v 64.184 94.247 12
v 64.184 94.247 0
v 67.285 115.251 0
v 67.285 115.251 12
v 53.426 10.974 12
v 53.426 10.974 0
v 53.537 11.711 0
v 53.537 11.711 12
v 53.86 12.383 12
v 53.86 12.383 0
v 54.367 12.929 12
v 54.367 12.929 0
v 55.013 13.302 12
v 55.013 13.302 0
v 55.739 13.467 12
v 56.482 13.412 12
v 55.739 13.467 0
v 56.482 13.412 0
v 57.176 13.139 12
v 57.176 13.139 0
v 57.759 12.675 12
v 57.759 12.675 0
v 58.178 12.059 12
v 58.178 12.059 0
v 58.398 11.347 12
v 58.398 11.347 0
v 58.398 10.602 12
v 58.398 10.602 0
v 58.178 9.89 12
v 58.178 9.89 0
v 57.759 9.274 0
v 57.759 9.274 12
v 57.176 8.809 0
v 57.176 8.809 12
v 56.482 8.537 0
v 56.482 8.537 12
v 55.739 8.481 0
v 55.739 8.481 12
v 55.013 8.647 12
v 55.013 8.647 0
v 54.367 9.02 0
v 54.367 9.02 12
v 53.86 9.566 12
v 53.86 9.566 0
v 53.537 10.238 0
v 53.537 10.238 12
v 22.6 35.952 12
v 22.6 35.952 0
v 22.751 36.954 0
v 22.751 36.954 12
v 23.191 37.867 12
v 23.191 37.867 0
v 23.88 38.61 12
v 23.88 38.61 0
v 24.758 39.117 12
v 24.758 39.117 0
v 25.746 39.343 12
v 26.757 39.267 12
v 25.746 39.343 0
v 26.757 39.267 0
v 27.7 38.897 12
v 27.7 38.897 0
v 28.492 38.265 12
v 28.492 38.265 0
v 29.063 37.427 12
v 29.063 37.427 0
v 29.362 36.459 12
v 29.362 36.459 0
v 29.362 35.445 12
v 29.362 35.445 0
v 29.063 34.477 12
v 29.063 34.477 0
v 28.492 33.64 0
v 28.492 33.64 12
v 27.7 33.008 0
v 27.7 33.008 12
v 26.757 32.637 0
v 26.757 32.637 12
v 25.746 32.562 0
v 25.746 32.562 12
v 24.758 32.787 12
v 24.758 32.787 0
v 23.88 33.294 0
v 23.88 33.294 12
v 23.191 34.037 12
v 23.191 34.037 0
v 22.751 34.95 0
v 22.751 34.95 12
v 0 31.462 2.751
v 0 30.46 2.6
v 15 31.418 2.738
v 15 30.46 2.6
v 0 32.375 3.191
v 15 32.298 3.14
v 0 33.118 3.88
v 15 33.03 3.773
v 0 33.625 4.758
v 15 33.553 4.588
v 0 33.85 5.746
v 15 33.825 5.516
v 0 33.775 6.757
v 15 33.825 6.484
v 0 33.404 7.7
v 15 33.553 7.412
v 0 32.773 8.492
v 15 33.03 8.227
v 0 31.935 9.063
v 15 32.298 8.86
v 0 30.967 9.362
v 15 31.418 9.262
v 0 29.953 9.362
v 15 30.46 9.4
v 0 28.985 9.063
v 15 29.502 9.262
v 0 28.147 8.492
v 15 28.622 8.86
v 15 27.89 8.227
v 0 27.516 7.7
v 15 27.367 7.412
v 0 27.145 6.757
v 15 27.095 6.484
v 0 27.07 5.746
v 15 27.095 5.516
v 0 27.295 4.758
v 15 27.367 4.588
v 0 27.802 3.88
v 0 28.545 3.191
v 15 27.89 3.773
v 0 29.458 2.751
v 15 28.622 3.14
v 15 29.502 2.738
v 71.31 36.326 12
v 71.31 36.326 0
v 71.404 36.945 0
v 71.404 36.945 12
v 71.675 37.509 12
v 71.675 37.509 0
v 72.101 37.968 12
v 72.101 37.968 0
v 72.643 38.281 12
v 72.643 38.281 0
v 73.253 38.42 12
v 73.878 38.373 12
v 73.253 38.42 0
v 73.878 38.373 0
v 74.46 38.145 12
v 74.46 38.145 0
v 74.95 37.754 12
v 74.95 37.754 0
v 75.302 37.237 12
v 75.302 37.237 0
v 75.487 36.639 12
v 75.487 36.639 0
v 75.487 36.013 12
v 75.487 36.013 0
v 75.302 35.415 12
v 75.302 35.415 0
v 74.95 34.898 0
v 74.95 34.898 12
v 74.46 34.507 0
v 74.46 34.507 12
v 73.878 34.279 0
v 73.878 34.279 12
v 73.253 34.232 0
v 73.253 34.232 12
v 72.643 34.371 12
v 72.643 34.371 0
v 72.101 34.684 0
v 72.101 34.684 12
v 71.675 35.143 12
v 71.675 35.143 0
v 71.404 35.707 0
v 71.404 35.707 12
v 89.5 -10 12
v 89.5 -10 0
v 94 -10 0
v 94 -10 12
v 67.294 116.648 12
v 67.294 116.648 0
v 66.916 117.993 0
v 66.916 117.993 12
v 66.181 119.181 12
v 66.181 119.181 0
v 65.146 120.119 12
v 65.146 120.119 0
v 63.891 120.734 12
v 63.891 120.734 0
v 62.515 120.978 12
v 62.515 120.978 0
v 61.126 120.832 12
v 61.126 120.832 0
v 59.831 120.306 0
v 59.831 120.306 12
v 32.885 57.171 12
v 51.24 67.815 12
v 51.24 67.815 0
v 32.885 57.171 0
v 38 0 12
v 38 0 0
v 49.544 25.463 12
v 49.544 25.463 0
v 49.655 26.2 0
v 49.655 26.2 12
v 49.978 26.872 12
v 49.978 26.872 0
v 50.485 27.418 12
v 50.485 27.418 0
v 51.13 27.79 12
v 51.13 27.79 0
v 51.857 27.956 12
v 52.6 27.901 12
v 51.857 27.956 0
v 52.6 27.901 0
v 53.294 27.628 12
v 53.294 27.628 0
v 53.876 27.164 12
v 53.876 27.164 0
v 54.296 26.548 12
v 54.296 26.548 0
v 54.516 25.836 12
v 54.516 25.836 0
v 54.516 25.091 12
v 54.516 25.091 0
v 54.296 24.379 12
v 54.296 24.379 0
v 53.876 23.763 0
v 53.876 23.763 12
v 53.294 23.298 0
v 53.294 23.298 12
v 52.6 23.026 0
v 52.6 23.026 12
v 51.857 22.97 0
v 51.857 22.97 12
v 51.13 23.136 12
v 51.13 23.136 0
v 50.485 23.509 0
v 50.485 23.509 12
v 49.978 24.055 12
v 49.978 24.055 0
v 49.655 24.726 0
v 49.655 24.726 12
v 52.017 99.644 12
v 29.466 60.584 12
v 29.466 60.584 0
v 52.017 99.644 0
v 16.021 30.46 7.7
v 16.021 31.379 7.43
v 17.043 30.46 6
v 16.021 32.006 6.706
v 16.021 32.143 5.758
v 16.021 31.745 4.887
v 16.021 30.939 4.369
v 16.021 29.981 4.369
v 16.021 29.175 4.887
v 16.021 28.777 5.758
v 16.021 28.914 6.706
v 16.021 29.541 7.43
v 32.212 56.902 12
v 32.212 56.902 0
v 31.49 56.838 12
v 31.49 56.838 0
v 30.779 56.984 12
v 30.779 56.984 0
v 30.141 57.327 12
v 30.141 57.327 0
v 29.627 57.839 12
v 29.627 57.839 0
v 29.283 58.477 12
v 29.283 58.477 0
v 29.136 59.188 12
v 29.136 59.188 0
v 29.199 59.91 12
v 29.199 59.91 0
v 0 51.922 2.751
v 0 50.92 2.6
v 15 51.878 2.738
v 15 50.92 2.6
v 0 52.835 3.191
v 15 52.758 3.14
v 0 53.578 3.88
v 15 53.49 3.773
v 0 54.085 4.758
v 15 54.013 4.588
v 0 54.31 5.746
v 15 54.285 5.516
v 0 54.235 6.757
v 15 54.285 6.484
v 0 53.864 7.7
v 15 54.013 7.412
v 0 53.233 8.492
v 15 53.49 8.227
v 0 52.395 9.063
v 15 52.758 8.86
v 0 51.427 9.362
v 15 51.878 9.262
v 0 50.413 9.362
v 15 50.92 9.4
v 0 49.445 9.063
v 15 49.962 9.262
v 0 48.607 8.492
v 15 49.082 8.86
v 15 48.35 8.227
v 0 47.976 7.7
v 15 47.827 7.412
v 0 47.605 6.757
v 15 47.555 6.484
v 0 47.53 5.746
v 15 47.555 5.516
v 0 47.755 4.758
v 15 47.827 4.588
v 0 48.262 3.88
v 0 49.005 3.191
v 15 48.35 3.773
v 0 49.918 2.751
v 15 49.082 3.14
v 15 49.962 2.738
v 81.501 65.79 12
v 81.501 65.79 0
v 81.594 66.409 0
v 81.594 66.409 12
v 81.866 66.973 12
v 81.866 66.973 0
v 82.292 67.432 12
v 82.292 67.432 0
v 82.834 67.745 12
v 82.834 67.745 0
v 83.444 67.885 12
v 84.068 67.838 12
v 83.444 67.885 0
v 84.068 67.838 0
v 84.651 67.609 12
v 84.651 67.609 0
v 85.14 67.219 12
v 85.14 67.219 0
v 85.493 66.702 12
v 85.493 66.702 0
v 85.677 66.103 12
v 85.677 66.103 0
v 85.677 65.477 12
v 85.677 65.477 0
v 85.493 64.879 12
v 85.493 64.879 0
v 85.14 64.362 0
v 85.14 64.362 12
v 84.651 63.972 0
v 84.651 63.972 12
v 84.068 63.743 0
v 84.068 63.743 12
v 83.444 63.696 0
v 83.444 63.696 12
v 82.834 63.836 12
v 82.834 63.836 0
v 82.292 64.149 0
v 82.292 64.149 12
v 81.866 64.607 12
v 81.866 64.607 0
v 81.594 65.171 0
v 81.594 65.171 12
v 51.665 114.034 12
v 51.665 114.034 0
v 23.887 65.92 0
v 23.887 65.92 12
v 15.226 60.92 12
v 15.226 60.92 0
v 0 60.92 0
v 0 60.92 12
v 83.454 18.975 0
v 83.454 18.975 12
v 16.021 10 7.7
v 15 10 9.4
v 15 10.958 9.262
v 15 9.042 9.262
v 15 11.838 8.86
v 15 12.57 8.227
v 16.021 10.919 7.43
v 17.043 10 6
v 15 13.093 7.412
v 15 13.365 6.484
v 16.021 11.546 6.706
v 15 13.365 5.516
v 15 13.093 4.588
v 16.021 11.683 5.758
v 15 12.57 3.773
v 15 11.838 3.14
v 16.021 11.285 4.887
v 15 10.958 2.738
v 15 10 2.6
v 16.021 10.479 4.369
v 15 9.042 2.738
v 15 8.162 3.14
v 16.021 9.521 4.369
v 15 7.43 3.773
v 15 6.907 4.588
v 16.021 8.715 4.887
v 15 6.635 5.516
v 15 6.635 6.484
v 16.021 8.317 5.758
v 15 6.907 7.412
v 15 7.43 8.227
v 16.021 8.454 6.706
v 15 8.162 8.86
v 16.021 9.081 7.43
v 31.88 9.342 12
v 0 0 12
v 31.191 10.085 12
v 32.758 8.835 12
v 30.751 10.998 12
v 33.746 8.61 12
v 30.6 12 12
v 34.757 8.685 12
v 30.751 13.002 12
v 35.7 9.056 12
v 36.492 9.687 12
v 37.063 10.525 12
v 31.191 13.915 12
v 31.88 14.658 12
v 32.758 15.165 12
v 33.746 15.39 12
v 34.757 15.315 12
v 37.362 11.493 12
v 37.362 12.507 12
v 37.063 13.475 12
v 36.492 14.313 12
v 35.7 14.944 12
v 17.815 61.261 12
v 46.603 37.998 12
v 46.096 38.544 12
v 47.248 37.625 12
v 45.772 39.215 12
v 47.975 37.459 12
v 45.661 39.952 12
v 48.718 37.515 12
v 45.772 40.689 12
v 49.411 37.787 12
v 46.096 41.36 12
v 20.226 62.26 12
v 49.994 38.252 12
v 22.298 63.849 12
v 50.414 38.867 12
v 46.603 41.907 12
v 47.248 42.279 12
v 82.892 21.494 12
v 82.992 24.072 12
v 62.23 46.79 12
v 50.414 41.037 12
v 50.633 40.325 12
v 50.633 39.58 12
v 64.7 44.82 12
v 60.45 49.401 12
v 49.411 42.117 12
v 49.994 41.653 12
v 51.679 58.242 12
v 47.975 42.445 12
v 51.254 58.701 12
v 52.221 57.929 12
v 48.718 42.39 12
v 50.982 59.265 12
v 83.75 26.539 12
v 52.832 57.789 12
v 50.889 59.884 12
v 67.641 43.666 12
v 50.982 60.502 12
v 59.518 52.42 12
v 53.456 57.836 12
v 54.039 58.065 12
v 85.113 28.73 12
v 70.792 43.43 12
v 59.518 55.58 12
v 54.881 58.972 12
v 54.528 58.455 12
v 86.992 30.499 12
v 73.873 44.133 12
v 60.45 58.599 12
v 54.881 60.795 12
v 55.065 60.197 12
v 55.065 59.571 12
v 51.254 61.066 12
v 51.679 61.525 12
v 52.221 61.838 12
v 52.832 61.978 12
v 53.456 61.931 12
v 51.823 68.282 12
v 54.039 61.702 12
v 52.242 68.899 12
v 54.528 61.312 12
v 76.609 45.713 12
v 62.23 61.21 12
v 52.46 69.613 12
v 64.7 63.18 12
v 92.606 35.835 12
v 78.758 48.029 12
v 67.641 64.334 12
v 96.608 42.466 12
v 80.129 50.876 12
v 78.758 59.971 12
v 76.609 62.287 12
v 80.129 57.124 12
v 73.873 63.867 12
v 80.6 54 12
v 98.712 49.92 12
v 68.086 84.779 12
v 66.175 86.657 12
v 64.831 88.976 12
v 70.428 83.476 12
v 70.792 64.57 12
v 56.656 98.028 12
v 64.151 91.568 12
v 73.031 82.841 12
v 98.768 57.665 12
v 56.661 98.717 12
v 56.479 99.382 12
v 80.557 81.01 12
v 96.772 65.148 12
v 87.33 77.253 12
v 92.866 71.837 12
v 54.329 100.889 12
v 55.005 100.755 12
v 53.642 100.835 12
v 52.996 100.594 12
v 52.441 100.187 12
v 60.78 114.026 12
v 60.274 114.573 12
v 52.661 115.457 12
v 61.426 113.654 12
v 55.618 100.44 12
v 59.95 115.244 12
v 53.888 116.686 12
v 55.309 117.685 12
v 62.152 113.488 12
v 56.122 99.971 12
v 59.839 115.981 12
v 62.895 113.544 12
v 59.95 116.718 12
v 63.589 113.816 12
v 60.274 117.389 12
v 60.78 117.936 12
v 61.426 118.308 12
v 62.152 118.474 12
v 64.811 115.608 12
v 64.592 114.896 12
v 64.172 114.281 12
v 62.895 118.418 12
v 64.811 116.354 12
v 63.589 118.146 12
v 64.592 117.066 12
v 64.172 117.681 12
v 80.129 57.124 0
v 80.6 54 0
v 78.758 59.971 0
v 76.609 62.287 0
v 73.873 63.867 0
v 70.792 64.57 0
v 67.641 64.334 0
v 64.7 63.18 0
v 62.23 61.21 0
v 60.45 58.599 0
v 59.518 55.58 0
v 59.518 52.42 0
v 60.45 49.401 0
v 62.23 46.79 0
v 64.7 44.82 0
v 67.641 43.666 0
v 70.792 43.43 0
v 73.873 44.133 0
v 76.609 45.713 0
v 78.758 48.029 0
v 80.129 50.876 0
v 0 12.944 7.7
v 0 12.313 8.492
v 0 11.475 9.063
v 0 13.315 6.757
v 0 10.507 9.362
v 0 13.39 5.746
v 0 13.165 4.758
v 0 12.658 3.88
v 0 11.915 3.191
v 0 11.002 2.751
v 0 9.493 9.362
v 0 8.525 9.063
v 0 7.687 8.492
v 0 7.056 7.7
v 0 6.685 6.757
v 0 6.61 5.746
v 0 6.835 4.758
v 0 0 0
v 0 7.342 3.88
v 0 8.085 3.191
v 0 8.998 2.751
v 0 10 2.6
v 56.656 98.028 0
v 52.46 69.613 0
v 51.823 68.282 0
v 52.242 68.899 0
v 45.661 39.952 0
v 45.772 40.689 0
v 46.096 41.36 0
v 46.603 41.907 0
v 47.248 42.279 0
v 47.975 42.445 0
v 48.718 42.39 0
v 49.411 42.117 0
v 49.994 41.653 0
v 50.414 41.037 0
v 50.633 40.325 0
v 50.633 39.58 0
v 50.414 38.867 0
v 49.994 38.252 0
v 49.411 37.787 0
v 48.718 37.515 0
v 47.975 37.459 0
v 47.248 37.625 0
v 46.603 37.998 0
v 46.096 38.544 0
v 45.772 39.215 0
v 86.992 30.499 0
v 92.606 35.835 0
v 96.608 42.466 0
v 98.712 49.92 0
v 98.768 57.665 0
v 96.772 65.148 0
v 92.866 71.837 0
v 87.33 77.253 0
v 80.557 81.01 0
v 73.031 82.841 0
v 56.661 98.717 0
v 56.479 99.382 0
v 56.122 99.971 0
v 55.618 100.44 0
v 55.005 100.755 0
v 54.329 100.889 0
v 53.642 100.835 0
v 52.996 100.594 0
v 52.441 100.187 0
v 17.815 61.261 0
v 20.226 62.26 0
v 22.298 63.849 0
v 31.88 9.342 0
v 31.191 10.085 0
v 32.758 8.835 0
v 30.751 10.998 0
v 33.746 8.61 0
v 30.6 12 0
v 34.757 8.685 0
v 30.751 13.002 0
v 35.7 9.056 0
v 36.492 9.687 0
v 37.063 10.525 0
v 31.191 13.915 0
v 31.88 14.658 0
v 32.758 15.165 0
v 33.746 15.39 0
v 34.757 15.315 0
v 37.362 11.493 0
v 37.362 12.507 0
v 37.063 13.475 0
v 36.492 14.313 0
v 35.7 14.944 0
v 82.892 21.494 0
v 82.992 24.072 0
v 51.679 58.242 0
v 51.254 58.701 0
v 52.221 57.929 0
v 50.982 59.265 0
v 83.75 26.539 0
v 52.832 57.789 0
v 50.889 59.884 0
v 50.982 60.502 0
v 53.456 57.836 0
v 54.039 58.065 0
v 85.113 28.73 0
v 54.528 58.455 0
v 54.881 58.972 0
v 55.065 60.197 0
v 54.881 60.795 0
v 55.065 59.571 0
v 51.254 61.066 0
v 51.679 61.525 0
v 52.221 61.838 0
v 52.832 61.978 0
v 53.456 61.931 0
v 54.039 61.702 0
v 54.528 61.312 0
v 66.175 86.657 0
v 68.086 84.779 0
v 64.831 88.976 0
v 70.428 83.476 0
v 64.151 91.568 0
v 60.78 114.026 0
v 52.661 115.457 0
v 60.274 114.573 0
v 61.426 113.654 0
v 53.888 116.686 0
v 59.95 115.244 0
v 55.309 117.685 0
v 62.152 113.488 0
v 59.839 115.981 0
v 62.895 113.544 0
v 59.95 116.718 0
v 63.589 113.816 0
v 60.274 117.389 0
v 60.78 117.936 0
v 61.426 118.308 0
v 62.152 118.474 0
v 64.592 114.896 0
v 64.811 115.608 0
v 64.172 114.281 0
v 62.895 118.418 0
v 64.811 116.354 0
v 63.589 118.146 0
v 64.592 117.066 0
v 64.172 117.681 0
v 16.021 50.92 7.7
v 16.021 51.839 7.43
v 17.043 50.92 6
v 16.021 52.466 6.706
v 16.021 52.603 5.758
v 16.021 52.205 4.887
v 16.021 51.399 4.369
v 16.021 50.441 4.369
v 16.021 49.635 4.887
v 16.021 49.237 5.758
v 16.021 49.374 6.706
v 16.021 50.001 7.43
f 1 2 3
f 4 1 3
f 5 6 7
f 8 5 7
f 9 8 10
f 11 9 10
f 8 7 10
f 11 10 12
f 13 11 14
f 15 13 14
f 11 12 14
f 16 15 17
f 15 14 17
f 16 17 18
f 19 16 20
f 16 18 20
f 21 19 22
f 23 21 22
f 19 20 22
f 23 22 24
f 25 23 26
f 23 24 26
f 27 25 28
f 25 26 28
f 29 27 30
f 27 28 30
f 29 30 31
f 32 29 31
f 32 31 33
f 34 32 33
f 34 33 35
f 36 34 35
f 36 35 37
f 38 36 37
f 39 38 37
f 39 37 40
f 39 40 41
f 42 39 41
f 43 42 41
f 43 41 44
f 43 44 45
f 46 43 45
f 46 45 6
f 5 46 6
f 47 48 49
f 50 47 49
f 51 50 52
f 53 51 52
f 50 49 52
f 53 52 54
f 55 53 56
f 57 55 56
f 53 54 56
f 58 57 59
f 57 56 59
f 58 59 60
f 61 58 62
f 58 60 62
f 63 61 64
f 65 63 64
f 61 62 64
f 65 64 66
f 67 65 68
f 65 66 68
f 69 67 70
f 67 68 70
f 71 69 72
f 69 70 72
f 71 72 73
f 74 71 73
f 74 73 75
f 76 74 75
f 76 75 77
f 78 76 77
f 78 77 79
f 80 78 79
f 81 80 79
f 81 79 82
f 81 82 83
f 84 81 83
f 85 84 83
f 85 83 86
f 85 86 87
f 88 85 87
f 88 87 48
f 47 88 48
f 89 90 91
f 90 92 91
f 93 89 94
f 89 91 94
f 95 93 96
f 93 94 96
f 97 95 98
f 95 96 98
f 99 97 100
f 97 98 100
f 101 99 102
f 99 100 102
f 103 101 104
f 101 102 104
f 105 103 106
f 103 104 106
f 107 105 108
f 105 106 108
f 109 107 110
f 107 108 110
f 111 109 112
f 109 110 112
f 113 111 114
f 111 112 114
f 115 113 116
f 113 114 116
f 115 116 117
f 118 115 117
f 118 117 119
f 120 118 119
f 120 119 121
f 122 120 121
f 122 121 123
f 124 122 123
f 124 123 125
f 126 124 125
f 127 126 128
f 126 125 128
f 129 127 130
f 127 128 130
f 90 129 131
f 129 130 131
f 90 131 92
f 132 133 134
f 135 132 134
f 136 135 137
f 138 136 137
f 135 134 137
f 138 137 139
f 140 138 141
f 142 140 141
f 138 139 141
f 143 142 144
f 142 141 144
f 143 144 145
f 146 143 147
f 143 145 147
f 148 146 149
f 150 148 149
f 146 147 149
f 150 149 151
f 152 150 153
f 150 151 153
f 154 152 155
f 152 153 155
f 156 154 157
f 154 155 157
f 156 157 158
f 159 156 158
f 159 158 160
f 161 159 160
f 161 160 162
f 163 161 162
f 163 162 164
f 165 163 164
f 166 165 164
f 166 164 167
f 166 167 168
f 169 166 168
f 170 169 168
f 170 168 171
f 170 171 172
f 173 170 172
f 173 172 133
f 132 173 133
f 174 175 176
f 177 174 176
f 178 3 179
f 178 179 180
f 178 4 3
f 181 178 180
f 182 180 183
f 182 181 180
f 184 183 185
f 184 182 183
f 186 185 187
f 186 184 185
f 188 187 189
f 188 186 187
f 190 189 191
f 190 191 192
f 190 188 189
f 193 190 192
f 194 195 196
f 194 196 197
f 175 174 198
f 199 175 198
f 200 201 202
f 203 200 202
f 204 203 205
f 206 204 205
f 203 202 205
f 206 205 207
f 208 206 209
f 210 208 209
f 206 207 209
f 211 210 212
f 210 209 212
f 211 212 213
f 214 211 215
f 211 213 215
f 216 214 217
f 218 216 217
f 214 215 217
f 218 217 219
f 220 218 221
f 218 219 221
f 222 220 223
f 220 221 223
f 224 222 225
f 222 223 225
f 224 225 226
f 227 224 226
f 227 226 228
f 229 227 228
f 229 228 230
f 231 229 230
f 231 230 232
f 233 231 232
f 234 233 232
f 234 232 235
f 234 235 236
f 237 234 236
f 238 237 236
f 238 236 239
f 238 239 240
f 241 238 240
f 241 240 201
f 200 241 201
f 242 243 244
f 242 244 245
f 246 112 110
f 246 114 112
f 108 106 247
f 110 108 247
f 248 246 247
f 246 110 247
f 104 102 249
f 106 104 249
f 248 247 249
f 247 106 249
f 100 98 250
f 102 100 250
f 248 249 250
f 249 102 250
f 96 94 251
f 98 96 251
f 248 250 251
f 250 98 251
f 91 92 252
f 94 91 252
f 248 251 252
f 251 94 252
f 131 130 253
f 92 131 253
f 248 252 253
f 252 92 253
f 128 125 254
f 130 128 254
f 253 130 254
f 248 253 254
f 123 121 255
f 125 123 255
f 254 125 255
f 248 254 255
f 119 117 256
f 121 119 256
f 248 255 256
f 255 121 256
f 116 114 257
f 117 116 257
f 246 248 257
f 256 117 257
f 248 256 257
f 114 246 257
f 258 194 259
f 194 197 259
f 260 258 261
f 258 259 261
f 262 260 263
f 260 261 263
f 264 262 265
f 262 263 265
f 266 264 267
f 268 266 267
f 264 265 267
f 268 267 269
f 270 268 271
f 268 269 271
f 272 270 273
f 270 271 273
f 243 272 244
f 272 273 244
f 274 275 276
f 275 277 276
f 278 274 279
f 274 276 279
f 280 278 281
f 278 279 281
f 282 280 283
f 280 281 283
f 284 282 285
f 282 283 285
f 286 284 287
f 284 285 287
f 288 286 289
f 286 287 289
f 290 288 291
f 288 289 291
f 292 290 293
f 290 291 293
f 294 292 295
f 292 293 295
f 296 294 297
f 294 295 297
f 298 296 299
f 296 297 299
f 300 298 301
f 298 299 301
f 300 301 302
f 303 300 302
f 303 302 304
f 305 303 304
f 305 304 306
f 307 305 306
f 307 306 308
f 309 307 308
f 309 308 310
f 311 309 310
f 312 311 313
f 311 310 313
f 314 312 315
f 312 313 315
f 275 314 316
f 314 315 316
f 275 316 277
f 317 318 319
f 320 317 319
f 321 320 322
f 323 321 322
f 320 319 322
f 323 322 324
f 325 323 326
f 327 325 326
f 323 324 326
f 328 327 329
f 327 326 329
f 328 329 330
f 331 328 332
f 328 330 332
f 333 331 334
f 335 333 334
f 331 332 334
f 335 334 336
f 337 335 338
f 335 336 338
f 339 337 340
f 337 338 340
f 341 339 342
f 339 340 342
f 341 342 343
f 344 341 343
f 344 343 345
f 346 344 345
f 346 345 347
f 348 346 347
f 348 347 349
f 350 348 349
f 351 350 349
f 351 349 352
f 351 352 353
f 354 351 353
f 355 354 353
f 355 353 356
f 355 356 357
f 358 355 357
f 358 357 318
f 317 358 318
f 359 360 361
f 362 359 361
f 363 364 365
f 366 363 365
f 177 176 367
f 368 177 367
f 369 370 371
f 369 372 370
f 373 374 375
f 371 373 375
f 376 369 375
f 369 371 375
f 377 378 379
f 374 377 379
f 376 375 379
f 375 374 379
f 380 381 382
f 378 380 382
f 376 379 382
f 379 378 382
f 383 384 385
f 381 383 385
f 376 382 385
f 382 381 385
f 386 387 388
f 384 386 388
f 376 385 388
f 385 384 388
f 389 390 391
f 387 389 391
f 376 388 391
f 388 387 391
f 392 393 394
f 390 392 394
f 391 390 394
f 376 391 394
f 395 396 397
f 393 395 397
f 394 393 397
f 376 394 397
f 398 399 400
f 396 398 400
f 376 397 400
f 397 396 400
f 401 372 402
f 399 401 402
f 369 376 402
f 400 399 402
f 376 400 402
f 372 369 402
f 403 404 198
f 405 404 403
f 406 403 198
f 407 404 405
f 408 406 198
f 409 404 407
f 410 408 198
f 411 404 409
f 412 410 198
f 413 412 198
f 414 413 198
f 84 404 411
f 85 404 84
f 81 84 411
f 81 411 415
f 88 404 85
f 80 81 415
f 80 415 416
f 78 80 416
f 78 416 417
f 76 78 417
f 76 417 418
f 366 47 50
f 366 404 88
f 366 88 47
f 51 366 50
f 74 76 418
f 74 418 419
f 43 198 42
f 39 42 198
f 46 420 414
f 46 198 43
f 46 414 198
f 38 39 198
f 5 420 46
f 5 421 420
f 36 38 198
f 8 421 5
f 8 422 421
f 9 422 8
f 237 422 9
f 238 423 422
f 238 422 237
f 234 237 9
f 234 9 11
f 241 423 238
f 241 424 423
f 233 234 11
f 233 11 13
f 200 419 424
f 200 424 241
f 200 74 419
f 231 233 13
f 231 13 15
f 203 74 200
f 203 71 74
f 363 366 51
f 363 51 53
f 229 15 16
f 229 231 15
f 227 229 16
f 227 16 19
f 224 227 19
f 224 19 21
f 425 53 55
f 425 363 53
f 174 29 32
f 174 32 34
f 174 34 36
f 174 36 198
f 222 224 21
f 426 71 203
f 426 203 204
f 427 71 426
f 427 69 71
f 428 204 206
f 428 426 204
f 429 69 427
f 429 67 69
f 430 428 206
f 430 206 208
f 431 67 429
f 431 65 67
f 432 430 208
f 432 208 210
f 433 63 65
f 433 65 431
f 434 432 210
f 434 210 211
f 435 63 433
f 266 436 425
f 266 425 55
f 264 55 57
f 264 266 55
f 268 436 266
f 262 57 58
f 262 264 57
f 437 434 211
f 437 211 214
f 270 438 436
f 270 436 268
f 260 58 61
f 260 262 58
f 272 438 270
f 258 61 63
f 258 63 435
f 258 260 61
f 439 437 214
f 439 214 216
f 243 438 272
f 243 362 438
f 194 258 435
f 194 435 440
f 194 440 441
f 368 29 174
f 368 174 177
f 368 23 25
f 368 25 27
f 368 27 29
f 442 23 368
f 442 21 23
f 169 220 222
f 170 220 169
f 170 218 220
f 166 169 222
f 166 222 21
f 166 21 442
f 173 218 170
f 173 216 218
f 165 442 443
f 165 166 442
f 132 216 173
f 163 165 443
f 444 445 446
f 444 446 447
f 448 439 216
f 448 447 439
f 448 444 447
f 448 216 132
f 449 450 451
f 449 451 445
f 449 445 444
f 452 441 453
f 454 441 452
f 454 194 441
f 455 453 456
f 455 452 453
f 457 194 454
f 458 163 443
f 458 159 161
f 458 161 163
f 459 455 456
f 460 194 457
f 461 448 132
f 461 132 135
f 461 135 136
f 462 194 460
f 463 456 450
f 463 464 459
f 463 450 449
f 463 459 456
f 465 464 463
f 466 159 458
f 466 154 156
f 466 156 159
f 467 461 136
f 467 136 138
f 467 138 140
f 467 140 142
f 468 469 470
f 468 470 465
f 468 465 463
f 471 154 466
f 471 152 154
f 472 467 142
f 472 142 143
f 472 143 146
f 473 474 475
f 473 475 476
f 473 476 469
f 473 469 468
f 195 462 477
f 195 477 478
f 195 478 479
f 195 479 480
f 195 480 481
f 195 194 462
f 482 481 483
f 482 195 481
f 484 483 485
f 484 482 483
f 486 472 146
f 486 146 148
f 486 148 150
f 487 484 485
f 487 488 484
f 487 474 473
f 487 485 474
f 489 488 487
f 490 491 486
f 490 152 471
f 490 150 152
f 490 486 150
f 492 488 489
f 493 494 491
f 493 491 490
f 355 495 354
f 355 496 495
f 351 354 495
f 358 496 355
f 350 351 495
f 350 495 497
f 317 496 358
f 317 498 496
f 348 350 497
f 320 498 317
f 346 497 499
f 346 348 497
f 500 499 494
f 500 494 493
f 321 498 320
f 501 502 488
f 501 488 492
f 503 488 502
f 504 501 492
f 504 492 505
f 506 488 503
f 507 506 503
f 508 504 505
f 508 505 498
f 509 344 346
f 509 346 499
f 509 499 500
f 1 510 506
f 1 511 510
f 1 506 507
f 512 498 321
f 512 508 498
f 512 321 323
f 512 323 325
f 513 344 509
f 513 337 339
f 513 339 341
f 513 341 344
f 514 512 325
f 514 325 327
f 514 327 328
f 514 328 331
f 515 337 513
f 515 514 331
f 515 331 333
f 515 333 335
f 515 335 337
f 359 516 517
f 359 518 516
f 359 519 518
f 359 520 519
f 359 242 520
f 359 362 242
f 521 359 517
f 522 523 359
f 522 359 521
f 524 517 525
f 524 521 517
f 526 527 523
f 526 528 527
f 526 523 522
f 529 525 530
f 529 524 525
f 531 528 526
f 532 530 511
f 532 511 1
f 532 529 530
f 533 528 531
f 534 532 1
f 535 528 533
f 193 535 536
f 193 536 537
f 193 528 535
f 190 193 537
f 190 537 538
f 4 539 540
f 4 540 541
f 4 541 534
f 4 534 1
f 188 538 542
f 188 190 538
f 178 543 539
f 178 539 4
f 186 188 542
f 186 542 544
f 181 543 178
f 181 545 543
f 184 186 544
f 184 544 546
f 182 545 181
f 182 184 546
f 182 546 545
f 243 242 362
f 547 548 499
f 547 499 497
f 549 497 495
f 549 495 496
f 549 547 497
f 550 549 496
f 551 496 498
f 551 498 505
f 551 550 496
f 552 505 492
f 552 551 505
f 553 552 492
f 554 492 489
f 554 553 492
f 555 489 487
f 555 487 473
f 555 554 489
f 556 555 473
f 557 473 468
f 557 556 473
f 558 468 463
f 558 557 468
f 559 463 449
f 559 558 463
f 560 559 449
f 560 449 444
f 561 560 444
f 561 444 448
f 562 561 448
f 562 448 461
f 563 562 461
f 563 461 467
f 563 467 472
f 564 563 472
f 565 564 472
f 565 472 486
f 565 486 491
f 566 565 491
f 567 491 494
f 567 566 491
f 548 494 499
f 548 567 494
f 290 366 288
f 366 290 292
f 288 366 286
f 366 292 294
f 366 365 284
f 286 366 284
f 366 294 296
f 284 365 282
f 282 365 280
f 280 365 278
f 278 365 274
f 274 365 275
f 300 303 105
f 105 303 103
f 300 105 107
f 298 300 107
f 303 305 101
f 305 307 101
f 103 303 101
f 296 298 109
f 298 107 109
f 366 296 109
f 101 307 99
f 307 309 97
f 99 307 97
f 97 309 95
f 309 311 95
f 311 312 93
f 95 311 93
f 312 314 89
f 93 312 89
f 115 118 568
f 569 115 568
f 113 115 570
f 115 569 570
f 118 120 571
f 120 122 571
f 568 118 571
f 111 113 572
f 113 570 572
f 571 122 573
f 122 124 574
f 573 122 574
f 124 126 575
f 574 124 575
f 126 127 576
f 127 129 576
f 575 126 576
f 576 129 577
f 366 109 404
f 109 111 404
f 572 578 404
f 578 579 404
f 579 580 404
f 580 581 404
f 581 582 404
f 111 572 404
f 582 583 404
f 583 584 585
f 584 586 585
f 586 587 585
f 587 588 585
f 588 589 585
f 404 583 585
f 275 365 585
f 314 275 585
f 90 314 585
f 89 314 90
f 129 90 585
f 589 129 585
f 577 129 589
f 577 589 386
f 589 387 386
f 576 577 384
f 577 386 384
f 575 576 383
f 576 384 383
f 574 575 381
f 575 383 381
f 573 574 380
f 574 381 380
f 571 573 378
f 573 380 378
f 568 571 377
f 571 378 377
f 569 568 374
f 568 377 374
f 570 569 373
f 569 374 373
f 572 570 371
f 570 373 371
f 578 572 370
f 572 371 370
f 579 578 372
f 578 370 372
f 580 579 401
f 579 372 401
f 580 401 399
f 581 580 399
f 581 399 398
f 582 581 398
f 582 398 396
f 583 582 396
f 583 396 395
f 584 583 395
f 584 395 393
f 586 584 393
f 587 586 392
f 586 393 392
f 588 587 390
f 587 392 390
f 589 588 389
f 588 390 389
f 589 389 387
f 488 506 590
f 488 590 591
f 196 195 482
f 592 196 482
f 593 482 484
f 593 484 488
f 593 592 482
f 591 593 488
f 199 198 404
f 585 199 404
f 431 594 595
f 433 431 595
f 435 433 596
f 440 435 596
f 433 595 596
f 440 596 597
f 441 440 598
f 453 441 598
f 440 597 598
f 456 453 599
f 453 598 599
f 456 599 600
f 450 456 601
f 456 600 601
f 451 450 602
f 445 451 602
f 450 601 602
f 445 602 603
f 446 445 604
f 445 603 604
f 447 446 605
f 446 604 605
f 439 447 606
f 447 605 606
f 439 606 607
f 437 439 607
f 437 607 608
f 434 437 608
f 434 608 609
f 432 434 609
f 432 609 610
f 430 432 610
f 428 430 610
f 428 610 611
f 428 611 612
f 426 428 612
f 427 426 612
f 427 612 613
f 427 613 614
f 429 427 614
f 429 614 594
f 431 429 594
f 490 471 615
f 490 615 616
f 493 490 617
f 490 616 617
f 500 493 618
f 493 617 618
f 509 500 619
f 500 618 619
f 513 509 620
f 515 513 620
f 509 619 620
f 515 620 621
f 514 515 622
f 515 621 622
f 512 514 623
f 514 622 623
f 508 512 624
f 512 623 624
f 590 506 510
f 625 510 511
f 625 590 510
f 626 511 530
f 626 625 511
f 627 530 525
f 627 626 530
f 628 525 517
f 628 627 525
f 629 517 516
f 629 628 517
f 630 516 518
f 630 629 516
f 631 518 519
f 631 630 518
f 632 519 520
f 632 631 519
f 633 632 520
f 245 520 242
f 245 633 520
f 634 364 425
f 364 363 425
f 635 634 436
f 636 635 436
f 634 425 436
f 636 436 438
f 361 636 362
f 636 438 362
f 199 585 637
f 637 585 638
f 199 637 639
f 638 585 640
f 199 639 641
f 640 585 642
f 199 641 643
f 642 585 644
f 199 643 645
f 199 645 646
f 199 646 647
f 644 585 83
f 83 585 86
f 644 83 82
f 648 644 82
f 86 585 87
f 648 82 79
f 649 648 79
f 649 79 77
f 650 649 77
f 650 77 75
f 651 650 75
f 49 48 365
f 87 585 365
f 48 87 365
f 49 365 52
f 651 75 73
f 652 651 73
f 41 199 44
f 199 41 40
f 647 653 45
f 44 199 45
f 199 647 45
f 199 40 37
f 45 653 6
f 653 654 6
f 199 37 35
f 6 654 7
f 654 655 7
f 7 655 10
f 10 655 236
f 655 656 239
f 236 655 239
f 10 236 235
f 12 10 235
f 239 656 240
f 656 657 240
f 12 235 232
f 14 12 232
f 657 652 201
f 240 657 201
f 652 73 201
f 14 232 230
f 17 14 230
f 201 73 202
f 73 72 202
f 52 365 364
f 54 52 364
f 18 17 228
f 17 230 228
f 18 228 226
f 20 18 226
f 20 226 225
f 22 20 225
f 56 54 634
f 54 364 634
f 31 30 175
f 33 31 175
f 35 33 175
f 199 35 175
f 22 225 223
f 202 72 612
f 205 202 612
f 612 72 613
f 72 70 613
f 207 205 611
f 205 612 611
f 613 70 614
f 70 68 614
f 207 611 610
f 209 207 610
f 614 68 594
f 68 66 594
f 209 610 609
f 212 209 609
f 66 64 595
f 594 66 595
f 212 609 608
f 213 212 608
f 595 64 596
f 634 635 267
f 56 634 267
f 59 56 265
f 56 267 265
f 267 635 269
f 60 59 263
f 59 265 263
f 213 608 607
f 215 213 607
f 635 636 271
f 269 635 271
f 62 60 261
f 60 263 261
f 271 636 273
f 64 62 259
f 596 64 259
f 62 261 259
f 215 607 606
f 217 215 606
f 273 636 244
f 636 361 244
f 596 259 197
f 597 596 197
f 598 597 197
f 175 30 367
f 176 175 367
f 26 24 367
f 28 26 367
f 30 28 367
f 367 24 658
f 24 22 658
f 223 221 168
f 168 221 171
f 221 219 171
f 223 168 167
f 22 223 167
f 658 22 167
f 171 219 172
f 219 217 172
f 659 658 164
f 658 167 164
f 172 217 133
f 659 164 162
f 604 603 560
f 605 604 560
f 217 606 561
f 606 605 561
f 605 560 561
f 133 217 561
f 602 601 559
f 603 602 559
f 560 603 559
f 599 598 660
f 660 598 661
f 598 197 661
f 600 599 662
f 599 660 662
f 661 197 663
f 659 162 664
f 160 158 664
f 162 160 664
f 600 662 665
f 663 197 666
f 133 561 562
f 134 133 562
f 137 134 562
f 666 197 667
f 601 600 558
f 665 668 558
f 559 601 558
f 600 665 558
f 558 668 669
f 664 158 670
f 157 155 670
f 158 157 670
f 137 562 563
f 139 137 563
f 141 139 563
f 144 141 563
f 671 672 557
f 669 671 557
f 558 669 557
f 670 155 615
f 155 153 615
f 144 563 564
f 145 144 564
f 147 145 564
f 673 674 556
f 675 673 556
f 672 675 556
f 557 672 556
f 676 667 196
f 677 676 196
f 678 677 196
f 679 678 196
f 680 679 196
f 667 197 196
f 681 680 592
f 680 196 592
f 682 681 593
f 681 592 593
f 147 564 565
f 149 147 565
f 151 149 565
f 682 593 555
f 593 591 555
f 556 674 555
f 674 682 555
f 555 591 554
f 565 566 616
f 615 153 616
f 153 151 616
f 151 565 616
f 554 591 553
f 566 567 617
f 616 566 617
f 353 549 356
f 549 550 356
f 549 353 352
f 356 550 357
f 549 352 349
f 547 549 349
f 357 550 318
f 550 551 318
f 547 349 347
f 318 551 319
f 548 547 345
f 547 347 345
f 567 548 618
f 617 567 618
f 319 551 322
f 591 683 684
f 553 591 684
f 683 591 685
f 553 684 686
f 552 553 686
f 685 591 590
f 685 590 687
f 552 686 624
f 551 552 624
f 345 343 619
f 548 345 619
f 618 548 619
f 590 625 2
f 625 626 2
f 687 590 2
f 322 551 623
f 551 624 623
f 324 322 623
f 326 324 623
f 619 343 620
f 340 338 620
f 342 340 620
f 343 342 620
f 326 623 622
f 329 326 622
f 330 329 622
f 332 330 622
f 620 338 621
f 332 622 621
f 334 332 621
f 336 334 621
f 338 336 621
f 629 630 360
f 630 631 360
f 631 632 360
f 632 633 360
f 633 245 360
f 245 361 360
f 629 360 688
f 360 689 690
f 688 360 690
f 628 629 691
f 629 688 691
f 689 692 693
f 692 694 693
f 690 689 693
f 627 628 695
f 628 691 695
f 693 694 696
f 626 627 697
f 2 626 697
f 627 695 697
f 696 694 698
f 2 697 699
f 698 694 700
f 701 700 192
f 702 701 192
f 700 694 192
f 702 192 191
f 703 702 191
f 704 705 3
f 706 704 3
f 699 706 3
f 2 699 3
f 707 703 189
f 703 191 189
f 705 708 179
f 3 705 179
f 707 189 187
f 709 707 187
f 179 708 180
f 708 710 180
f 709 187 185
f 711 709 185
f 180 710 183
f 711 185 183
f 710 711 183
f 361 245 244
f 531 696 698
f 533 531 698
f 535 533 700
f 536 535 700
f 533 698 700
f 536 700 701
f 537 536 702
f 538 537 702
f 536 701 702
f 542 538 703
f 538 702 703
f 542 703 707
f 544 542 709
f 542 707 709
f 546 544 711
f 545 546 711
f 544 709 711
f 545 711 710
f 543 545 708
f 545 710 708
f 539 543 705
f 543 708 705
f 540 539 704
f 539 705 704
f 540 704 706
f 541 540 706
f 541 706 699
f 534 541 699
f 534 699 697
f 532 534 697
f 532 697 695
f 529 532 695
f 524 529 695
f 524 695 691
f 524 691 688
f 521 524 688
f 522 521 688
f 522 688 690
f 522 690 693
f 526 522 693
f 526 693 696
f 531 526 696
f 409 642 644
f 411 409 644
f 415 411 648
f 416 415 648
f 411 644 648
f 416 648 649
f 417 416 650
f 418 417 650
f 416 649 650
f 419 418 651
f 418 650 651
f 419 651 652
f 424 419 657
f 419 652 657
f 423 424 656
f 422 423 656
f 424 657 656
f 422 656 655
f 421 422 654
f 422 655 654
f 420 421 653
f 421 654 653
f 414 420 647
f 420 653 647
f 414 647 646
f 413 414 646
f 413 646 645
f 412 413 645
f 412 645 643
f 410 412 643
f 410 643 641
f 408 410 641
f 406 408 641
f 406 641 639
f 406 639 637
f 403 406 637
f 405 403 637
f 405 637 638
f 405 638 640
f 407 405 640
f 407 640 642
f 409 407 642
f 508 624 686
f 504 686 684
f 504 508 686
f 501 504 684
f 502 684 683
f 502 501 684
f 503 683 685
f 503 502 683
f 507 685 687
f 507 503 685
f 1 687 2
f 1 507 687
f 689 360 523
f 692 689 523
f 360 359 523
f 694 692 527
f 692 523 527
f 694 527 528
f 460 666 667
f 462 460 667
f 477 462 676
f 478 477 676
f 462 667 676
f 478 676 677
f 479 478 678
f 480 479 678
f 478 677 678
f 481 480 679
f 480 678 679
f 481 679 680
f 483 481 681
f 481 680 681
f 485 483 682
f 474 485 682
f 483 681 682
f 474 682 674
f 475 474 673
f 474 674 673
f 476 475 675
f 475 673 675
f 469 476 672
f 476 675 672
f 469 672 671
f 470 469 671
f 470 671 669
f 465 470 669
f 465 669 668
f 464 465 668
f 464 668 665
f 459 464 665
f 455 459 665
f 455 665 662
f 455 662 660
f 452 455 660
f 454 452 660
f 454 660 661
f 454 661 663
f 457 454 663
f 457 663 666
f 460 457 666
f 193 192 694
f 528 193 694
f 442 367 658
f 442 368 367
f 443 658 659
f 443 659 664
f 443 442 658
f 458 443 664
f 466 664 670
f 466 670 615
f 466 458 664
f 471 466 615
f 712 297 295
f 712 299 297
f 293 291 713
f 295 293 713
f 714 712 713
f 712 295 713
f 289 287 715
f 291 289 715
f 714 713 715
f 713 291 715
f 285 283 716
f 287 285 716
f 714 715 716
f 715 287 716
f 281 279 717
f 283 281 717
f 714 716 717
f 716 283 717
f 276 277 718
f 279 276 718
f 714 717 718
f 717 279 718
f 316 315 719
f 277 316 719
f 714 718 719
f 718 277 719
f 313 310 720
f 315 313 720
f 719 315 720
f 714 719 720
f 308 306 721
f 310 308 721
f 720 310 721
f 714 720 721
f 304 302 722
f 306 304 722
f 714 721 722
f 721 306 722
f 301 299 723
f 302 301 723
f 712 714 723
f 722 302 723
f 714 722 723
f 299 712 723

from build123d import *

# Parameters (mm, degrees)
ESBO_O1_R                                   = 10.6
RESSALTO_EXTRUS_O1_DEPTH                    = 12
FILETE1_R                                   = 10
CORTE_EXTRUS_O1_DEPTH                       = 161.30276936
FILETE3_R                                   = 2.5
CORTE_EXTRUS_O2_DEPTH                       = 161.30276936
BROCA_DE_ROSQUEAR_PARA_TARRAXA_DE_M81_D     = 6.8
BROCA_DE_ROSQUEAR_PARA_TARRAXA_DE_M81_DEPTH = 15
BROCA_DE_ROSQUEAR_PARA_TARRAXA_DE_M81_TIP   = 2.042926105
FILETE6_R                                   = 10
FILETE7_R                                   = 5
BROCA_DE_ROSQUEAR_PARA_TARRAXA_DE_M61_D     = 5
BROCA_DE_ROSQUEAR_PARA_TARRAXA_DE_M82_D     = 6.8
BROCA_DE_ROSQUEAR_PARA_TARRAXA_DE_M51_D     = 4.2
BROCA_DE_ROSQUEAR_PARA_TARRAXA_DE_M62_D     = 5


with BuildPart() as part:
    # Esboço1 → Ressalto-extrusão1 (new body)
    with BuildSketch(Plane.XY):
        with BuildLine():
            Line((0, 0), (36, 0))
            Line((36, 0), (36, -10))
            Line((36, -10), (94, -10))
            Line((94, -10), (80.53931892, 26.982917317))
            ThreePointArc((80.53931892, 26.982917317), (97.53650317, 63.096207626), (62.372346743, 81.978901083))
            Line((62.372346743, 81.978901083), (68.8, 125.506883733))
            Line((68.8, 125.506883733), (53, 116.345625842))
            Line((53, 116.345625842), (21, 60.92))
            Line((21, 60.92), (0, 60.92))
            Line((0, 60.92), (0, 0))
        make_face()
        with Locations((70, 54)):
            Circle(ESBO_O1_R, mode=Mode.SUBTRACT)
    extrude(amount=RESSALTO_EXTRUS_O1_DEPTH)

    # Filete1
    filete1_edges = [part.edges().sort_by_distance(p)[0] for p in [
        (21, 60.92, 6),
        (53, 116.345625842, 6),
        (62.372346743, 81.978901083, 6),
    ]]
    fillet(filete1_edges, radius=FILETE1_R)

    # Esboço2 → Corte-extrusão1 (cut, through all)
    with BuildSketch(Plane.XY.offset(12)):
        Polygon((24.783390445, 52.473024476), (58.570061959, 110.993256157), (52.283390445, 68.42), align=None)
    extrude(amount=-CORTE_EXTRUS_O1_DEPTH, mode=Mode.SUBTRACT)

    # Filete3
    filete3_edges = [part.edges().sort_by_distance(p)[0] for p in [
        (52.283390445, 68.42, 6),
        (24.783390445, 52.473024476, 6),
        (58.570061959, 110.993256157, 6),
    ]]
    fillet(filete3_edges, radius=FILETE3_R)

    # Esboço8 → Corte-extrusão2 (cut, through all)
    with BuildSketch(Plane.XY.offset(12)):
        Polygon((89.5, -10), (38, 0), (36, 0), (36, -10), align=None)
    extrude(amount=-CORTE_EXTRUS_O2_DEPTH, mode=Mode.SUBTRACT)

    # Broca de rosquear para tarraxa de M81
    with Locations(Plane.ZY):
        with Locations((6, 50.92), (6, 30.46), (6, 10)):
            Hole(BROCA_DE_ROSQUEAR_PARA_TARRAXA_DE_M81_D / 2, depth=BROCA_DE_ROSQUEAR_PARA_TARRAXA_DE_M81_DEPTH)
            with Locations((0, 0, -(BROCA_DE_ROSQUEAR_PARA_TARRAXA_DE_M81_DEPTH + BROCA_DE_ROSQUEAR_PARA_TARRAXA_DE_M81_TIP / 2))):  # 118° drill point
                Cone(0, BROCA_DE_ROSQUEAR_PARA_TARRAXA_DE_M81_D / 2, BROCA_DE_ROSQUEAR_PARA_TARRAXA_DE_M81_TIP, mode=Mode.SUBTRACT)

    # Filete6
    filete6_edges = [part.edges().sort_by_distance(p)[0] for p in [
        (80.53931892, 26.982917317, 6),
    ]]
    fillet(filete6_edges, radius=FILETE6_R)

    # Filete7
    filete7_edges = [part.edges().sort_by_distance(p)[0] for p in [
        (68.8, 125.506883733, 6),
    ]]
    fillet(filete7_edges, radius=FILETE7_R)

    # Broca de rosquear para tarraxa de M61 (through all)
    with Locations(Plane.XY.offset(12)):
        with Locations((48.161384096, 39.952181527), (52.043669773, 25.463294133), (55.925955449, 10.974406739)):
            Hole(BROCA_DE_ROSQUEAR_PARA_TARRAXA_DE_M61_D / 2)

    # Broca de rosquear para tarraxa de M82 (through all)
    with Locations(Plane.XY.offset(12)):
        with Locations((26, 35.952181527), (34, 12)):
            Hole(BROCA_DE_ROSQUEAR_PARA_TARRAXA_DE_M82_D / 2)

    # Broca de rosquear para tarraxa de M51 (through all)
    with Locations(Plane.XY.offset(12)):
        with Locations((83.600921147, 65.790459871), (73.410377197, 36.326026837), (52.988701656, 59.883513293)):
            Hole(BROCA_DE_ROSQUEAR_PARA_TARRAXA_DE_M51_D / 2)

    # Broca de rosquear para tarraxa de M62 (through all)
    with Locations(Plane.XY.offset(12)):
        with Locations((62.339118507, 115.980990674)):
            Hole(BROCA_DE_ROSQUEAR_PARA_TARRAXA_DE_M62_D / 2)


solid = part.part
